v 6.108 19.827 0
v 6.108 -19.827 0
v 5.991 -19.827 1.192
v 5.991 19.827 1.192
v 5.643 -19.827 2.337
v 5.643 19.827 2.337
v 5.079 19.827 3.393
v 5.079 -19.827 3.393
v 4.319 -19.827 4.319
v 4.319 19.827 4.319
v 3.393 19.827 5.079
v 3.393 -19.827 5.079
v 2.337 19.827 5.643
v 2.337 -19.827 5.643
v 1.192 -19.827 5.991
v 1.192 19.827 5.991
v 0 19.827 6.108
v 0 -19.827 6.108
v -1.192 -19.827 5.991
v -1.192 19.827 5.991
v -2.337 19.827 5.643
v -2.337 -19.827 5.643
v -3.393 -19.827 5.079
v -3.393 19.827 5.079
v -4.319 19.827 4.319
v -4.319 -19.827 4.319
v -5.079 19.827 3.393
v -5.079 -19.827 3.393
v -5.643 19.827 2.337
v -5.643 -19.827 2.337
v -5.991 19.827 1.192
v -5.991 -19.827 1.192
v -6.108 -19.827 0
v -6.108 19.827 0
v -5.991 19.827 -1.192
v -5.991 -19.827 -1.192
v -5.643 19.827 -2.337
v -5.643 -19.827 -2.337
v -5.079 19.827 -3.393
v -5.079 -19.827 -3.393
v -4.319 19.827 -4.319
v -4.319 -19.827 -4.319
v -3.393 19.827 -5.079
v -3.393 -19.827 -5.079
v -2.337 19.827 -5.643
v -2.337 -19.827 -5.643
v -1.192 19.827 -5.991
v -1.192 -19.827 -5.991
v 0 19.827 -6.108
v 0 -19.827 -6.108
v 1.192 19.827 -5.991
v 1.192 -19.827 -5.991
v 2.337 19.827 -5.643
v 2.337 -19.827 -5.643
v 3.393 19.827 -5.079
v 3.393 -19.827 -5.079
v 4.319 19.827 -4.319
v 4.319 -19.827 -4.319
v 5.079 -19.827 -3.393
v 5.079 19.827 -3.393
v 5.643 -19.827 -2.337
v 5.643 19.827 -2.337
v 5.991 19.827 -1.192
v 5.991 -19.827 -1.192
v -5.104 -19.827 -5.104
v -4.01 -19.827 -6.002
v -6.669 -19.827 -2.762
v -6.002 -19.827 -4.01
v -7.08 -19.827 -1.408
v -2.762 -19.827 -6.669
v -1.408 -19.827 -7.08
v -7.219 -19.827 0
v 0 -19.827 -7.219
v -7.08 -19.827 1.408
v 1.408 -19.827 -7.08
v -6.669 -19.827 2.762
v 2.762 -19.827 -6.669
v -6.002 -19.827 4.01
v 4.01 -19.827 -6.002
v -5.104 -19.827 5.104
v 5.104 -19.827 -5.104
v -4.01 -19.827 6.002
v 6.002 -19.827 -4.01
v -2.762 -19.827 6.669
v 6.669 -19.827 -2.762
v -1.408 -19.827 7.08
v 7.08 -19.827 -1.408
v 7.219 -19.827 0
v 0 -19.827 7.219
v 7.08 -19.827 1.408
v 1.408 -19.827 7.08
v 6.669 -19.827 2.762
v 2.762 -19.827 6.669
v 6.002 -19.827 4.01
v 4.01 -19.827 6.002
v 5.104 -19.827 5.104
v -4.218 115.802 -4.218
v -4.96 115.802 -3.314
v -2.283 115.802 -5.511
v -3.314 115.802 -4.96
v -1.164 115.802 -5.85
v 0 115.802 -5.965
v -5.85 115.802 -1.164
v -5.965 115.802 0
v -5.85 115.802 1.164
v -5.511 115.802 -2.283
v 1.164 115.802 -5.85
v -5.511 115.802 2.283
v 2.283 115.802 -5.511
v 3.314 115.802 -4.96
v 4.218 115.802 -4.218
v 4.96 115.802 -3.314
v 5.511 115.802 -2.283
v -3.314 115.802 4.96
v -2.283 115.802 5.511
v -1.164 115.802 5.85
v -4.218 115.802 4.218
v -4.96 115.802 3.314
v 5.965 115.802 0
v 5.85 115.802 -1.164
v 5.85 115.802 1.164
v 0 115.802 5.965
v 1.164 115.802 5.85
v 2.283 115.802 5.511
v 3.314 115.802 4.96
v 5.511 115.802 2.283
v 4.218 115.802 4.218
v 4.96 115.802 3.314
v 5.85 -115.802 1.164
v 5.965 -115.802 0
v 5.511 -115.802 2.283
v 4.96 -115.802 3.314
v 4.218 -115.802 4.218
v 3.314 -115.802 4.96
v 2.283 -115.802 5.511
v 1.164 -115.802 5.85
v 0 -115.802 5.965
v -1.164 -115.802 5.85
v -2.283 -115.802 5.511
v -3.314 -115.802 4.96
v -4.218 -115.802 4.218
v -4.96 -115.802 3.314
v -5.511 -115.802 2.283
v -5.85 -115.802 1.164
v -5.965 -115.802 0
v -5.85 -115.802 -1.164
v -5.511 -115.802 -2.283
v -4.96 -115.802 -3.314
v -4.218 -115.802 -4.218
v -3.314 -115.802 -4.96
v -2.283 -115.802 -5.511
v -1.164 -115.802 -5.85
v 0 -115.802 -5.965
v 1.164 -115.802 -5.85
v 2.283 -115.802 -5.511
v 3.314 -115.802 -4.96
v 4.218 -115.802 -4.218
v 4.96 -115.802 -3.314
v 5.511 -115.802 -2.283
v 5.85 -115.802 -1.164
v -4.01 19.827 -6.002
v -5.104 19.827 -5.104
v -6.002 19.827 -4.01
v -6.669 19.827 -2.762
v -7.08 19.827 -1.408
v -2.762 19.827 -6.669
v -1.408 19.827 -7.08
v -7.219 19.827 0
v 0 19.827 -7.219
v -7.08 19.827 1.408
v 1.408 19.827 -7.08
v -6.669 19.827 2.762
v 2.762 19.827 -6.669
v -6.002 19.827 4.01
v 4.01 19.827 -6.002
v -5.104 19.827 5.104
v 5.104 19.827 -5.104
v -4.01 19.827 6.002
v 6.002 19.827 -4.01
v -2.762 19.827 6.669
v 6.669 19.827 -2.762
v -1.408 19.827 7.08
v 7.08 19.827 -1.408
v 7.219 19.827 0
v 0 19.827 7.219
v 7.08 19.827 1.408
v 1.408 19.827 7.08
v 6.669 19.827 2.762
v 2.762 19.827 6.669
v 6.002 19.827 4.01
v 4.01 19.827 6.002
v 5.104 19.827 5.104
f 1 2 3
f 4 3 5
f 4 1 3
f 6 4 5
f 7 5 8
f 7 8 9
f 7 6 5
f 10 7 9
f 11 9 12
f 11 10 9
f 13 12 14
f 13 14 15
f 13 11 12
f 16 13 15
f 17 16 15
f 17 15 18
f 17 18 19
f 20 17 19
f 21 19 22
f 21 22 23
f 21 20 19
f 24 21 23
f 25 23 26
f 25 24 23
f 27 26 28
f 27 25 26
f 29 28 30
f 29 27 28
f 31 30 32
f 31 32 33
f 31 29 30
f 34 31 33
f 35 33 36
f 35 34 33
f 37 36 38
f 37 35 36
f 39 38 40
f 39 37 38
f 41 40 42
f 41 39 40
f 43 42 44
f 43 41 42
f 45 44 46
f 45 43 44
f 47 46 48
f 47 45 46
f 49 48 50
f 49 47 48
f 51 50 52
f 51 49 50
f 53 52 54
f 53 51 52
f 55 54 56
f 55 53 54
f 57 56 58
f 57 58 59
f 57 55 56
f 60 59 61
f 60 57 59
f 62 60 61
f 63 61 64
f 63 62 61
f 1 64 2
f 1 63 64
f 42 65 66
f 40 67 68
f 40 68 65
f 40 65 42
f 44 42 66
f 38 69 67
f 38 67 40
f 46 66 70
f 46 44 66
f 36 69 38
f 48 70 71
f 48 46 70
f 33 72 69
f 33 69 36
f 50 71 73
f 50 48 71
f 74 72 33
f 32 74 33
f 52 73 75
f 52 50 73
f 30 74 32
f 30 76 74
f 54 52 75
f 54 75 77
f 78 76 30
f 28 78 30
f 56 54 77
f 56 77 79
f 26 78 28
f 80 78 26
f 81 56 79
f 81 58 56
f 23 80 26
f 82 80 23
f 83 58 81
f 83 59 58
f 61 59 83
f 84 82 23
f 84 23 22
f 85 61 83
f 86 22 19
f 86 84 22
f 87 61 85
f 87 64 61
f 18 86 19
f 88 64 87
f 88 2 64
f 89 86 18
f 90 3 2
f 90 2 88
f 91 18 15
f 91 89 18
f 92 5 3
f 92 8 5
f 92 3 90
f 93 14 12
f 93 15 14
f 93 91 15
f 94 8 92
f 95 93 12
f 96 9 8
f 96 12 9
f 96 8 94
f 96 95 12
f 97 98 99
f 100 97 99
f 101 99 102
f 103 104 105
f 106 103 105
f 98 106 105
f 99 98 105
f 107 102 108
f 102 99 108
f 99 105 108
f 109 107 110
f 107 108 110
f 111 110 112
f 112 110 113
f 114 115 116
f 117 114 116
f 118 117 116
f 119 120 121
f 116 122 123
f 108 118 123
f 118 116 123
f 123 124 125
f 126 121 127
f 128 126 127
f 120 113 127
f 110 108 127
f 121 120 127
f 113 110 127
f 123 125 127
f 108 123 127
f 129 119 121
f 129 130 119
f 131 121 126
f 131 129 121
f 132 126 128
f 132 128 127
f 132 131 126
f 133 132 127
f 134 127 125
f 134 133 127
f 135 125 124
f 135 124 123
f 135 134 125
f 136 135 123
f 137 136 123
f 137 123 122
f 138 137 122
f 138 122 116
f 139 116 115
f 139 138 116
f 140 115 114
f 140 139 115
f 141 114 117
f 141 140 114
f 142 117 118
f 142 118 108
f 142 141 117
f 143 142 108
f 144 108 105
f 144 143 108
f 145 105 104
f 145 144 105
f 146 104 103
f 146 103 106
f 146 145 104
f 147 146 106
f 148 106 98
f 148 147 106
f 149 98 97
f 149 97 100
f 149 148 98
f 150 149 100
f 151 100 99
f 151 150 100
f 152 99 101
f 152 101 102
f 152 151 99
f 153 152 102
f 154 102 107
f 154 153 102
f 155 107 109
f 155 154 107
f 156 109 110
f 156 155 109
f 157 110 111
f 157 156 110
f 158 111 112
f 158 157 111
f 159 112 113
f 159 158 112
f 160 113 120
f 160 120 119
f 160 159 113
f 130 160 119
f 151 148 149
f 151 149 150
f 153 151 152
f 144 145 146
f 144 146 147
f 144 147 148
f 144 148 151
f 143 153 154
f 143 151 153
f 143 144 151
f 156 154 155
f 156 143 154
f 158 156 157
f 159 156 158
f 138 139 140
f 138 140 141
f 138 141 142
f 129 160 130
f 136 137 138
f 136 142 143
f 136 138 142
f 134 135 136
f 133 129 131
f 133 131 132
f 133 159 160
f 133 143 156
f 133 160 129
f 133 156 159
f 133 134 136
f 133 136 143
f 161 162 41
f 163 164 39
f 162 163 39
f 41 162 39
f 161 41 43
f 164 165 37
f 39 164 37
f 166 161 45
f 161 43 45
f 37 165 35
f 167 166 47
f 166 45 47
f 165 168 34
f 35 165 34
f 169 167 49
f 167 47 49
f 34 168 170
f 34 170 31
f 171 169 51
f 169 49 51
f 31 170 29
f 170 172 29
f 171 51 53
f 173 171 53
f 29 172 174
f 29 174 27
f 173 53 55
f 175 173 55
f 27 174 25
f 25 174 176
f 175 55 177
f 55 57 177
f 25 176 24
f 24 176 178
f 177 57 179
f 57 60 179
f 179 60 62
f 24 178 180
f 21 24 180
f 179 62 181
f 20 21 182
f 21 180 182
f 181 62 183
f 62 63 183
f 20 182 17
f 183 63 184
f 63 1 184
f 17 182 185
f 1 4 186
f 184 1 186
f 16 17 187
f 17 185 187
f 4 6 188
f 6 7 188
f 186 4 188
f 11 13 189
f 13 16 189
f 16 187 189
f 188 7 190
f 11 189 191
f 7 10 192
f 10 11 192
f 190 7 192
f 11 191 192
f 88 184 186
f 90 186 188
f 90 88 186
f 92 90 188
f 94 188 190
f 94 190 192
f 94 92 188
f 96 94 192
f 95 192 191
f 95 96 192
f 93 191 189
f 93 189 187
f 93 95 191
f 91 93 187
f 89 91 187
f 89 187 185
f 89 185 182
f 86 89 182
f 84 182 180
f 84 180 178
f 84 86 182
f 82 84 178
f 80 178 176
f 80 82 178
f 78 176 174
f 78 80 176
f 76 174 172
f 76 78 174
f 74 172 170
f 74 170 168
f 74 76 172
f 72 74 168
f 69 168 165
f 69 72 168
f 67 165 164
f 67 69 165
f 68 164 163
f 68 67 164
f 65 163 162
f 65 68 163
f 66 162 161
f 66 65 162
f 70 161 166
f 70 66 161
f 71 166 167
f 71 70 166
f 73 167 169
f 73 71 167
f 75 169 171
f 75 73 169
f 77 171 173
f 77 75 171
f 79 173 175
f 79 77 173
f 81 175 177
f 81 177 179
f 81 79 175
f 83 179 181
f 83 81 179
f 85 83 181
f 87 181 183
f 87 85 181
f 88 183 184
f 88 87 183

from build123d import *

# Parameters (mm, degrees)
F0_R     = 5.965067
F1_DEPTH = 115.80196
F2_R     = 7.218678
F2_R_2   = 6.108046
F3_DEPTH = 19.827146


with BuildPart() as f1:
    # F0 (on Front) → F1 (new body, symmetric)
    with BuildSketch(Plane.XZ):
        Circle(F0_R)
    extrude(amount=F1_DEPTH, both=True)


with BuildPart() as f3:
    # F2 (on Front) → F3 (new body, symmetric)
    with BuildSketch(Plane.XZ):
        Circle(F2_R)
        Circle(F2_R_2, mode=Mode.SUBTRACT)
    extrude(amount=F3_DEPTH, both=True)


solid = Compound([f1.part, f3.part])
